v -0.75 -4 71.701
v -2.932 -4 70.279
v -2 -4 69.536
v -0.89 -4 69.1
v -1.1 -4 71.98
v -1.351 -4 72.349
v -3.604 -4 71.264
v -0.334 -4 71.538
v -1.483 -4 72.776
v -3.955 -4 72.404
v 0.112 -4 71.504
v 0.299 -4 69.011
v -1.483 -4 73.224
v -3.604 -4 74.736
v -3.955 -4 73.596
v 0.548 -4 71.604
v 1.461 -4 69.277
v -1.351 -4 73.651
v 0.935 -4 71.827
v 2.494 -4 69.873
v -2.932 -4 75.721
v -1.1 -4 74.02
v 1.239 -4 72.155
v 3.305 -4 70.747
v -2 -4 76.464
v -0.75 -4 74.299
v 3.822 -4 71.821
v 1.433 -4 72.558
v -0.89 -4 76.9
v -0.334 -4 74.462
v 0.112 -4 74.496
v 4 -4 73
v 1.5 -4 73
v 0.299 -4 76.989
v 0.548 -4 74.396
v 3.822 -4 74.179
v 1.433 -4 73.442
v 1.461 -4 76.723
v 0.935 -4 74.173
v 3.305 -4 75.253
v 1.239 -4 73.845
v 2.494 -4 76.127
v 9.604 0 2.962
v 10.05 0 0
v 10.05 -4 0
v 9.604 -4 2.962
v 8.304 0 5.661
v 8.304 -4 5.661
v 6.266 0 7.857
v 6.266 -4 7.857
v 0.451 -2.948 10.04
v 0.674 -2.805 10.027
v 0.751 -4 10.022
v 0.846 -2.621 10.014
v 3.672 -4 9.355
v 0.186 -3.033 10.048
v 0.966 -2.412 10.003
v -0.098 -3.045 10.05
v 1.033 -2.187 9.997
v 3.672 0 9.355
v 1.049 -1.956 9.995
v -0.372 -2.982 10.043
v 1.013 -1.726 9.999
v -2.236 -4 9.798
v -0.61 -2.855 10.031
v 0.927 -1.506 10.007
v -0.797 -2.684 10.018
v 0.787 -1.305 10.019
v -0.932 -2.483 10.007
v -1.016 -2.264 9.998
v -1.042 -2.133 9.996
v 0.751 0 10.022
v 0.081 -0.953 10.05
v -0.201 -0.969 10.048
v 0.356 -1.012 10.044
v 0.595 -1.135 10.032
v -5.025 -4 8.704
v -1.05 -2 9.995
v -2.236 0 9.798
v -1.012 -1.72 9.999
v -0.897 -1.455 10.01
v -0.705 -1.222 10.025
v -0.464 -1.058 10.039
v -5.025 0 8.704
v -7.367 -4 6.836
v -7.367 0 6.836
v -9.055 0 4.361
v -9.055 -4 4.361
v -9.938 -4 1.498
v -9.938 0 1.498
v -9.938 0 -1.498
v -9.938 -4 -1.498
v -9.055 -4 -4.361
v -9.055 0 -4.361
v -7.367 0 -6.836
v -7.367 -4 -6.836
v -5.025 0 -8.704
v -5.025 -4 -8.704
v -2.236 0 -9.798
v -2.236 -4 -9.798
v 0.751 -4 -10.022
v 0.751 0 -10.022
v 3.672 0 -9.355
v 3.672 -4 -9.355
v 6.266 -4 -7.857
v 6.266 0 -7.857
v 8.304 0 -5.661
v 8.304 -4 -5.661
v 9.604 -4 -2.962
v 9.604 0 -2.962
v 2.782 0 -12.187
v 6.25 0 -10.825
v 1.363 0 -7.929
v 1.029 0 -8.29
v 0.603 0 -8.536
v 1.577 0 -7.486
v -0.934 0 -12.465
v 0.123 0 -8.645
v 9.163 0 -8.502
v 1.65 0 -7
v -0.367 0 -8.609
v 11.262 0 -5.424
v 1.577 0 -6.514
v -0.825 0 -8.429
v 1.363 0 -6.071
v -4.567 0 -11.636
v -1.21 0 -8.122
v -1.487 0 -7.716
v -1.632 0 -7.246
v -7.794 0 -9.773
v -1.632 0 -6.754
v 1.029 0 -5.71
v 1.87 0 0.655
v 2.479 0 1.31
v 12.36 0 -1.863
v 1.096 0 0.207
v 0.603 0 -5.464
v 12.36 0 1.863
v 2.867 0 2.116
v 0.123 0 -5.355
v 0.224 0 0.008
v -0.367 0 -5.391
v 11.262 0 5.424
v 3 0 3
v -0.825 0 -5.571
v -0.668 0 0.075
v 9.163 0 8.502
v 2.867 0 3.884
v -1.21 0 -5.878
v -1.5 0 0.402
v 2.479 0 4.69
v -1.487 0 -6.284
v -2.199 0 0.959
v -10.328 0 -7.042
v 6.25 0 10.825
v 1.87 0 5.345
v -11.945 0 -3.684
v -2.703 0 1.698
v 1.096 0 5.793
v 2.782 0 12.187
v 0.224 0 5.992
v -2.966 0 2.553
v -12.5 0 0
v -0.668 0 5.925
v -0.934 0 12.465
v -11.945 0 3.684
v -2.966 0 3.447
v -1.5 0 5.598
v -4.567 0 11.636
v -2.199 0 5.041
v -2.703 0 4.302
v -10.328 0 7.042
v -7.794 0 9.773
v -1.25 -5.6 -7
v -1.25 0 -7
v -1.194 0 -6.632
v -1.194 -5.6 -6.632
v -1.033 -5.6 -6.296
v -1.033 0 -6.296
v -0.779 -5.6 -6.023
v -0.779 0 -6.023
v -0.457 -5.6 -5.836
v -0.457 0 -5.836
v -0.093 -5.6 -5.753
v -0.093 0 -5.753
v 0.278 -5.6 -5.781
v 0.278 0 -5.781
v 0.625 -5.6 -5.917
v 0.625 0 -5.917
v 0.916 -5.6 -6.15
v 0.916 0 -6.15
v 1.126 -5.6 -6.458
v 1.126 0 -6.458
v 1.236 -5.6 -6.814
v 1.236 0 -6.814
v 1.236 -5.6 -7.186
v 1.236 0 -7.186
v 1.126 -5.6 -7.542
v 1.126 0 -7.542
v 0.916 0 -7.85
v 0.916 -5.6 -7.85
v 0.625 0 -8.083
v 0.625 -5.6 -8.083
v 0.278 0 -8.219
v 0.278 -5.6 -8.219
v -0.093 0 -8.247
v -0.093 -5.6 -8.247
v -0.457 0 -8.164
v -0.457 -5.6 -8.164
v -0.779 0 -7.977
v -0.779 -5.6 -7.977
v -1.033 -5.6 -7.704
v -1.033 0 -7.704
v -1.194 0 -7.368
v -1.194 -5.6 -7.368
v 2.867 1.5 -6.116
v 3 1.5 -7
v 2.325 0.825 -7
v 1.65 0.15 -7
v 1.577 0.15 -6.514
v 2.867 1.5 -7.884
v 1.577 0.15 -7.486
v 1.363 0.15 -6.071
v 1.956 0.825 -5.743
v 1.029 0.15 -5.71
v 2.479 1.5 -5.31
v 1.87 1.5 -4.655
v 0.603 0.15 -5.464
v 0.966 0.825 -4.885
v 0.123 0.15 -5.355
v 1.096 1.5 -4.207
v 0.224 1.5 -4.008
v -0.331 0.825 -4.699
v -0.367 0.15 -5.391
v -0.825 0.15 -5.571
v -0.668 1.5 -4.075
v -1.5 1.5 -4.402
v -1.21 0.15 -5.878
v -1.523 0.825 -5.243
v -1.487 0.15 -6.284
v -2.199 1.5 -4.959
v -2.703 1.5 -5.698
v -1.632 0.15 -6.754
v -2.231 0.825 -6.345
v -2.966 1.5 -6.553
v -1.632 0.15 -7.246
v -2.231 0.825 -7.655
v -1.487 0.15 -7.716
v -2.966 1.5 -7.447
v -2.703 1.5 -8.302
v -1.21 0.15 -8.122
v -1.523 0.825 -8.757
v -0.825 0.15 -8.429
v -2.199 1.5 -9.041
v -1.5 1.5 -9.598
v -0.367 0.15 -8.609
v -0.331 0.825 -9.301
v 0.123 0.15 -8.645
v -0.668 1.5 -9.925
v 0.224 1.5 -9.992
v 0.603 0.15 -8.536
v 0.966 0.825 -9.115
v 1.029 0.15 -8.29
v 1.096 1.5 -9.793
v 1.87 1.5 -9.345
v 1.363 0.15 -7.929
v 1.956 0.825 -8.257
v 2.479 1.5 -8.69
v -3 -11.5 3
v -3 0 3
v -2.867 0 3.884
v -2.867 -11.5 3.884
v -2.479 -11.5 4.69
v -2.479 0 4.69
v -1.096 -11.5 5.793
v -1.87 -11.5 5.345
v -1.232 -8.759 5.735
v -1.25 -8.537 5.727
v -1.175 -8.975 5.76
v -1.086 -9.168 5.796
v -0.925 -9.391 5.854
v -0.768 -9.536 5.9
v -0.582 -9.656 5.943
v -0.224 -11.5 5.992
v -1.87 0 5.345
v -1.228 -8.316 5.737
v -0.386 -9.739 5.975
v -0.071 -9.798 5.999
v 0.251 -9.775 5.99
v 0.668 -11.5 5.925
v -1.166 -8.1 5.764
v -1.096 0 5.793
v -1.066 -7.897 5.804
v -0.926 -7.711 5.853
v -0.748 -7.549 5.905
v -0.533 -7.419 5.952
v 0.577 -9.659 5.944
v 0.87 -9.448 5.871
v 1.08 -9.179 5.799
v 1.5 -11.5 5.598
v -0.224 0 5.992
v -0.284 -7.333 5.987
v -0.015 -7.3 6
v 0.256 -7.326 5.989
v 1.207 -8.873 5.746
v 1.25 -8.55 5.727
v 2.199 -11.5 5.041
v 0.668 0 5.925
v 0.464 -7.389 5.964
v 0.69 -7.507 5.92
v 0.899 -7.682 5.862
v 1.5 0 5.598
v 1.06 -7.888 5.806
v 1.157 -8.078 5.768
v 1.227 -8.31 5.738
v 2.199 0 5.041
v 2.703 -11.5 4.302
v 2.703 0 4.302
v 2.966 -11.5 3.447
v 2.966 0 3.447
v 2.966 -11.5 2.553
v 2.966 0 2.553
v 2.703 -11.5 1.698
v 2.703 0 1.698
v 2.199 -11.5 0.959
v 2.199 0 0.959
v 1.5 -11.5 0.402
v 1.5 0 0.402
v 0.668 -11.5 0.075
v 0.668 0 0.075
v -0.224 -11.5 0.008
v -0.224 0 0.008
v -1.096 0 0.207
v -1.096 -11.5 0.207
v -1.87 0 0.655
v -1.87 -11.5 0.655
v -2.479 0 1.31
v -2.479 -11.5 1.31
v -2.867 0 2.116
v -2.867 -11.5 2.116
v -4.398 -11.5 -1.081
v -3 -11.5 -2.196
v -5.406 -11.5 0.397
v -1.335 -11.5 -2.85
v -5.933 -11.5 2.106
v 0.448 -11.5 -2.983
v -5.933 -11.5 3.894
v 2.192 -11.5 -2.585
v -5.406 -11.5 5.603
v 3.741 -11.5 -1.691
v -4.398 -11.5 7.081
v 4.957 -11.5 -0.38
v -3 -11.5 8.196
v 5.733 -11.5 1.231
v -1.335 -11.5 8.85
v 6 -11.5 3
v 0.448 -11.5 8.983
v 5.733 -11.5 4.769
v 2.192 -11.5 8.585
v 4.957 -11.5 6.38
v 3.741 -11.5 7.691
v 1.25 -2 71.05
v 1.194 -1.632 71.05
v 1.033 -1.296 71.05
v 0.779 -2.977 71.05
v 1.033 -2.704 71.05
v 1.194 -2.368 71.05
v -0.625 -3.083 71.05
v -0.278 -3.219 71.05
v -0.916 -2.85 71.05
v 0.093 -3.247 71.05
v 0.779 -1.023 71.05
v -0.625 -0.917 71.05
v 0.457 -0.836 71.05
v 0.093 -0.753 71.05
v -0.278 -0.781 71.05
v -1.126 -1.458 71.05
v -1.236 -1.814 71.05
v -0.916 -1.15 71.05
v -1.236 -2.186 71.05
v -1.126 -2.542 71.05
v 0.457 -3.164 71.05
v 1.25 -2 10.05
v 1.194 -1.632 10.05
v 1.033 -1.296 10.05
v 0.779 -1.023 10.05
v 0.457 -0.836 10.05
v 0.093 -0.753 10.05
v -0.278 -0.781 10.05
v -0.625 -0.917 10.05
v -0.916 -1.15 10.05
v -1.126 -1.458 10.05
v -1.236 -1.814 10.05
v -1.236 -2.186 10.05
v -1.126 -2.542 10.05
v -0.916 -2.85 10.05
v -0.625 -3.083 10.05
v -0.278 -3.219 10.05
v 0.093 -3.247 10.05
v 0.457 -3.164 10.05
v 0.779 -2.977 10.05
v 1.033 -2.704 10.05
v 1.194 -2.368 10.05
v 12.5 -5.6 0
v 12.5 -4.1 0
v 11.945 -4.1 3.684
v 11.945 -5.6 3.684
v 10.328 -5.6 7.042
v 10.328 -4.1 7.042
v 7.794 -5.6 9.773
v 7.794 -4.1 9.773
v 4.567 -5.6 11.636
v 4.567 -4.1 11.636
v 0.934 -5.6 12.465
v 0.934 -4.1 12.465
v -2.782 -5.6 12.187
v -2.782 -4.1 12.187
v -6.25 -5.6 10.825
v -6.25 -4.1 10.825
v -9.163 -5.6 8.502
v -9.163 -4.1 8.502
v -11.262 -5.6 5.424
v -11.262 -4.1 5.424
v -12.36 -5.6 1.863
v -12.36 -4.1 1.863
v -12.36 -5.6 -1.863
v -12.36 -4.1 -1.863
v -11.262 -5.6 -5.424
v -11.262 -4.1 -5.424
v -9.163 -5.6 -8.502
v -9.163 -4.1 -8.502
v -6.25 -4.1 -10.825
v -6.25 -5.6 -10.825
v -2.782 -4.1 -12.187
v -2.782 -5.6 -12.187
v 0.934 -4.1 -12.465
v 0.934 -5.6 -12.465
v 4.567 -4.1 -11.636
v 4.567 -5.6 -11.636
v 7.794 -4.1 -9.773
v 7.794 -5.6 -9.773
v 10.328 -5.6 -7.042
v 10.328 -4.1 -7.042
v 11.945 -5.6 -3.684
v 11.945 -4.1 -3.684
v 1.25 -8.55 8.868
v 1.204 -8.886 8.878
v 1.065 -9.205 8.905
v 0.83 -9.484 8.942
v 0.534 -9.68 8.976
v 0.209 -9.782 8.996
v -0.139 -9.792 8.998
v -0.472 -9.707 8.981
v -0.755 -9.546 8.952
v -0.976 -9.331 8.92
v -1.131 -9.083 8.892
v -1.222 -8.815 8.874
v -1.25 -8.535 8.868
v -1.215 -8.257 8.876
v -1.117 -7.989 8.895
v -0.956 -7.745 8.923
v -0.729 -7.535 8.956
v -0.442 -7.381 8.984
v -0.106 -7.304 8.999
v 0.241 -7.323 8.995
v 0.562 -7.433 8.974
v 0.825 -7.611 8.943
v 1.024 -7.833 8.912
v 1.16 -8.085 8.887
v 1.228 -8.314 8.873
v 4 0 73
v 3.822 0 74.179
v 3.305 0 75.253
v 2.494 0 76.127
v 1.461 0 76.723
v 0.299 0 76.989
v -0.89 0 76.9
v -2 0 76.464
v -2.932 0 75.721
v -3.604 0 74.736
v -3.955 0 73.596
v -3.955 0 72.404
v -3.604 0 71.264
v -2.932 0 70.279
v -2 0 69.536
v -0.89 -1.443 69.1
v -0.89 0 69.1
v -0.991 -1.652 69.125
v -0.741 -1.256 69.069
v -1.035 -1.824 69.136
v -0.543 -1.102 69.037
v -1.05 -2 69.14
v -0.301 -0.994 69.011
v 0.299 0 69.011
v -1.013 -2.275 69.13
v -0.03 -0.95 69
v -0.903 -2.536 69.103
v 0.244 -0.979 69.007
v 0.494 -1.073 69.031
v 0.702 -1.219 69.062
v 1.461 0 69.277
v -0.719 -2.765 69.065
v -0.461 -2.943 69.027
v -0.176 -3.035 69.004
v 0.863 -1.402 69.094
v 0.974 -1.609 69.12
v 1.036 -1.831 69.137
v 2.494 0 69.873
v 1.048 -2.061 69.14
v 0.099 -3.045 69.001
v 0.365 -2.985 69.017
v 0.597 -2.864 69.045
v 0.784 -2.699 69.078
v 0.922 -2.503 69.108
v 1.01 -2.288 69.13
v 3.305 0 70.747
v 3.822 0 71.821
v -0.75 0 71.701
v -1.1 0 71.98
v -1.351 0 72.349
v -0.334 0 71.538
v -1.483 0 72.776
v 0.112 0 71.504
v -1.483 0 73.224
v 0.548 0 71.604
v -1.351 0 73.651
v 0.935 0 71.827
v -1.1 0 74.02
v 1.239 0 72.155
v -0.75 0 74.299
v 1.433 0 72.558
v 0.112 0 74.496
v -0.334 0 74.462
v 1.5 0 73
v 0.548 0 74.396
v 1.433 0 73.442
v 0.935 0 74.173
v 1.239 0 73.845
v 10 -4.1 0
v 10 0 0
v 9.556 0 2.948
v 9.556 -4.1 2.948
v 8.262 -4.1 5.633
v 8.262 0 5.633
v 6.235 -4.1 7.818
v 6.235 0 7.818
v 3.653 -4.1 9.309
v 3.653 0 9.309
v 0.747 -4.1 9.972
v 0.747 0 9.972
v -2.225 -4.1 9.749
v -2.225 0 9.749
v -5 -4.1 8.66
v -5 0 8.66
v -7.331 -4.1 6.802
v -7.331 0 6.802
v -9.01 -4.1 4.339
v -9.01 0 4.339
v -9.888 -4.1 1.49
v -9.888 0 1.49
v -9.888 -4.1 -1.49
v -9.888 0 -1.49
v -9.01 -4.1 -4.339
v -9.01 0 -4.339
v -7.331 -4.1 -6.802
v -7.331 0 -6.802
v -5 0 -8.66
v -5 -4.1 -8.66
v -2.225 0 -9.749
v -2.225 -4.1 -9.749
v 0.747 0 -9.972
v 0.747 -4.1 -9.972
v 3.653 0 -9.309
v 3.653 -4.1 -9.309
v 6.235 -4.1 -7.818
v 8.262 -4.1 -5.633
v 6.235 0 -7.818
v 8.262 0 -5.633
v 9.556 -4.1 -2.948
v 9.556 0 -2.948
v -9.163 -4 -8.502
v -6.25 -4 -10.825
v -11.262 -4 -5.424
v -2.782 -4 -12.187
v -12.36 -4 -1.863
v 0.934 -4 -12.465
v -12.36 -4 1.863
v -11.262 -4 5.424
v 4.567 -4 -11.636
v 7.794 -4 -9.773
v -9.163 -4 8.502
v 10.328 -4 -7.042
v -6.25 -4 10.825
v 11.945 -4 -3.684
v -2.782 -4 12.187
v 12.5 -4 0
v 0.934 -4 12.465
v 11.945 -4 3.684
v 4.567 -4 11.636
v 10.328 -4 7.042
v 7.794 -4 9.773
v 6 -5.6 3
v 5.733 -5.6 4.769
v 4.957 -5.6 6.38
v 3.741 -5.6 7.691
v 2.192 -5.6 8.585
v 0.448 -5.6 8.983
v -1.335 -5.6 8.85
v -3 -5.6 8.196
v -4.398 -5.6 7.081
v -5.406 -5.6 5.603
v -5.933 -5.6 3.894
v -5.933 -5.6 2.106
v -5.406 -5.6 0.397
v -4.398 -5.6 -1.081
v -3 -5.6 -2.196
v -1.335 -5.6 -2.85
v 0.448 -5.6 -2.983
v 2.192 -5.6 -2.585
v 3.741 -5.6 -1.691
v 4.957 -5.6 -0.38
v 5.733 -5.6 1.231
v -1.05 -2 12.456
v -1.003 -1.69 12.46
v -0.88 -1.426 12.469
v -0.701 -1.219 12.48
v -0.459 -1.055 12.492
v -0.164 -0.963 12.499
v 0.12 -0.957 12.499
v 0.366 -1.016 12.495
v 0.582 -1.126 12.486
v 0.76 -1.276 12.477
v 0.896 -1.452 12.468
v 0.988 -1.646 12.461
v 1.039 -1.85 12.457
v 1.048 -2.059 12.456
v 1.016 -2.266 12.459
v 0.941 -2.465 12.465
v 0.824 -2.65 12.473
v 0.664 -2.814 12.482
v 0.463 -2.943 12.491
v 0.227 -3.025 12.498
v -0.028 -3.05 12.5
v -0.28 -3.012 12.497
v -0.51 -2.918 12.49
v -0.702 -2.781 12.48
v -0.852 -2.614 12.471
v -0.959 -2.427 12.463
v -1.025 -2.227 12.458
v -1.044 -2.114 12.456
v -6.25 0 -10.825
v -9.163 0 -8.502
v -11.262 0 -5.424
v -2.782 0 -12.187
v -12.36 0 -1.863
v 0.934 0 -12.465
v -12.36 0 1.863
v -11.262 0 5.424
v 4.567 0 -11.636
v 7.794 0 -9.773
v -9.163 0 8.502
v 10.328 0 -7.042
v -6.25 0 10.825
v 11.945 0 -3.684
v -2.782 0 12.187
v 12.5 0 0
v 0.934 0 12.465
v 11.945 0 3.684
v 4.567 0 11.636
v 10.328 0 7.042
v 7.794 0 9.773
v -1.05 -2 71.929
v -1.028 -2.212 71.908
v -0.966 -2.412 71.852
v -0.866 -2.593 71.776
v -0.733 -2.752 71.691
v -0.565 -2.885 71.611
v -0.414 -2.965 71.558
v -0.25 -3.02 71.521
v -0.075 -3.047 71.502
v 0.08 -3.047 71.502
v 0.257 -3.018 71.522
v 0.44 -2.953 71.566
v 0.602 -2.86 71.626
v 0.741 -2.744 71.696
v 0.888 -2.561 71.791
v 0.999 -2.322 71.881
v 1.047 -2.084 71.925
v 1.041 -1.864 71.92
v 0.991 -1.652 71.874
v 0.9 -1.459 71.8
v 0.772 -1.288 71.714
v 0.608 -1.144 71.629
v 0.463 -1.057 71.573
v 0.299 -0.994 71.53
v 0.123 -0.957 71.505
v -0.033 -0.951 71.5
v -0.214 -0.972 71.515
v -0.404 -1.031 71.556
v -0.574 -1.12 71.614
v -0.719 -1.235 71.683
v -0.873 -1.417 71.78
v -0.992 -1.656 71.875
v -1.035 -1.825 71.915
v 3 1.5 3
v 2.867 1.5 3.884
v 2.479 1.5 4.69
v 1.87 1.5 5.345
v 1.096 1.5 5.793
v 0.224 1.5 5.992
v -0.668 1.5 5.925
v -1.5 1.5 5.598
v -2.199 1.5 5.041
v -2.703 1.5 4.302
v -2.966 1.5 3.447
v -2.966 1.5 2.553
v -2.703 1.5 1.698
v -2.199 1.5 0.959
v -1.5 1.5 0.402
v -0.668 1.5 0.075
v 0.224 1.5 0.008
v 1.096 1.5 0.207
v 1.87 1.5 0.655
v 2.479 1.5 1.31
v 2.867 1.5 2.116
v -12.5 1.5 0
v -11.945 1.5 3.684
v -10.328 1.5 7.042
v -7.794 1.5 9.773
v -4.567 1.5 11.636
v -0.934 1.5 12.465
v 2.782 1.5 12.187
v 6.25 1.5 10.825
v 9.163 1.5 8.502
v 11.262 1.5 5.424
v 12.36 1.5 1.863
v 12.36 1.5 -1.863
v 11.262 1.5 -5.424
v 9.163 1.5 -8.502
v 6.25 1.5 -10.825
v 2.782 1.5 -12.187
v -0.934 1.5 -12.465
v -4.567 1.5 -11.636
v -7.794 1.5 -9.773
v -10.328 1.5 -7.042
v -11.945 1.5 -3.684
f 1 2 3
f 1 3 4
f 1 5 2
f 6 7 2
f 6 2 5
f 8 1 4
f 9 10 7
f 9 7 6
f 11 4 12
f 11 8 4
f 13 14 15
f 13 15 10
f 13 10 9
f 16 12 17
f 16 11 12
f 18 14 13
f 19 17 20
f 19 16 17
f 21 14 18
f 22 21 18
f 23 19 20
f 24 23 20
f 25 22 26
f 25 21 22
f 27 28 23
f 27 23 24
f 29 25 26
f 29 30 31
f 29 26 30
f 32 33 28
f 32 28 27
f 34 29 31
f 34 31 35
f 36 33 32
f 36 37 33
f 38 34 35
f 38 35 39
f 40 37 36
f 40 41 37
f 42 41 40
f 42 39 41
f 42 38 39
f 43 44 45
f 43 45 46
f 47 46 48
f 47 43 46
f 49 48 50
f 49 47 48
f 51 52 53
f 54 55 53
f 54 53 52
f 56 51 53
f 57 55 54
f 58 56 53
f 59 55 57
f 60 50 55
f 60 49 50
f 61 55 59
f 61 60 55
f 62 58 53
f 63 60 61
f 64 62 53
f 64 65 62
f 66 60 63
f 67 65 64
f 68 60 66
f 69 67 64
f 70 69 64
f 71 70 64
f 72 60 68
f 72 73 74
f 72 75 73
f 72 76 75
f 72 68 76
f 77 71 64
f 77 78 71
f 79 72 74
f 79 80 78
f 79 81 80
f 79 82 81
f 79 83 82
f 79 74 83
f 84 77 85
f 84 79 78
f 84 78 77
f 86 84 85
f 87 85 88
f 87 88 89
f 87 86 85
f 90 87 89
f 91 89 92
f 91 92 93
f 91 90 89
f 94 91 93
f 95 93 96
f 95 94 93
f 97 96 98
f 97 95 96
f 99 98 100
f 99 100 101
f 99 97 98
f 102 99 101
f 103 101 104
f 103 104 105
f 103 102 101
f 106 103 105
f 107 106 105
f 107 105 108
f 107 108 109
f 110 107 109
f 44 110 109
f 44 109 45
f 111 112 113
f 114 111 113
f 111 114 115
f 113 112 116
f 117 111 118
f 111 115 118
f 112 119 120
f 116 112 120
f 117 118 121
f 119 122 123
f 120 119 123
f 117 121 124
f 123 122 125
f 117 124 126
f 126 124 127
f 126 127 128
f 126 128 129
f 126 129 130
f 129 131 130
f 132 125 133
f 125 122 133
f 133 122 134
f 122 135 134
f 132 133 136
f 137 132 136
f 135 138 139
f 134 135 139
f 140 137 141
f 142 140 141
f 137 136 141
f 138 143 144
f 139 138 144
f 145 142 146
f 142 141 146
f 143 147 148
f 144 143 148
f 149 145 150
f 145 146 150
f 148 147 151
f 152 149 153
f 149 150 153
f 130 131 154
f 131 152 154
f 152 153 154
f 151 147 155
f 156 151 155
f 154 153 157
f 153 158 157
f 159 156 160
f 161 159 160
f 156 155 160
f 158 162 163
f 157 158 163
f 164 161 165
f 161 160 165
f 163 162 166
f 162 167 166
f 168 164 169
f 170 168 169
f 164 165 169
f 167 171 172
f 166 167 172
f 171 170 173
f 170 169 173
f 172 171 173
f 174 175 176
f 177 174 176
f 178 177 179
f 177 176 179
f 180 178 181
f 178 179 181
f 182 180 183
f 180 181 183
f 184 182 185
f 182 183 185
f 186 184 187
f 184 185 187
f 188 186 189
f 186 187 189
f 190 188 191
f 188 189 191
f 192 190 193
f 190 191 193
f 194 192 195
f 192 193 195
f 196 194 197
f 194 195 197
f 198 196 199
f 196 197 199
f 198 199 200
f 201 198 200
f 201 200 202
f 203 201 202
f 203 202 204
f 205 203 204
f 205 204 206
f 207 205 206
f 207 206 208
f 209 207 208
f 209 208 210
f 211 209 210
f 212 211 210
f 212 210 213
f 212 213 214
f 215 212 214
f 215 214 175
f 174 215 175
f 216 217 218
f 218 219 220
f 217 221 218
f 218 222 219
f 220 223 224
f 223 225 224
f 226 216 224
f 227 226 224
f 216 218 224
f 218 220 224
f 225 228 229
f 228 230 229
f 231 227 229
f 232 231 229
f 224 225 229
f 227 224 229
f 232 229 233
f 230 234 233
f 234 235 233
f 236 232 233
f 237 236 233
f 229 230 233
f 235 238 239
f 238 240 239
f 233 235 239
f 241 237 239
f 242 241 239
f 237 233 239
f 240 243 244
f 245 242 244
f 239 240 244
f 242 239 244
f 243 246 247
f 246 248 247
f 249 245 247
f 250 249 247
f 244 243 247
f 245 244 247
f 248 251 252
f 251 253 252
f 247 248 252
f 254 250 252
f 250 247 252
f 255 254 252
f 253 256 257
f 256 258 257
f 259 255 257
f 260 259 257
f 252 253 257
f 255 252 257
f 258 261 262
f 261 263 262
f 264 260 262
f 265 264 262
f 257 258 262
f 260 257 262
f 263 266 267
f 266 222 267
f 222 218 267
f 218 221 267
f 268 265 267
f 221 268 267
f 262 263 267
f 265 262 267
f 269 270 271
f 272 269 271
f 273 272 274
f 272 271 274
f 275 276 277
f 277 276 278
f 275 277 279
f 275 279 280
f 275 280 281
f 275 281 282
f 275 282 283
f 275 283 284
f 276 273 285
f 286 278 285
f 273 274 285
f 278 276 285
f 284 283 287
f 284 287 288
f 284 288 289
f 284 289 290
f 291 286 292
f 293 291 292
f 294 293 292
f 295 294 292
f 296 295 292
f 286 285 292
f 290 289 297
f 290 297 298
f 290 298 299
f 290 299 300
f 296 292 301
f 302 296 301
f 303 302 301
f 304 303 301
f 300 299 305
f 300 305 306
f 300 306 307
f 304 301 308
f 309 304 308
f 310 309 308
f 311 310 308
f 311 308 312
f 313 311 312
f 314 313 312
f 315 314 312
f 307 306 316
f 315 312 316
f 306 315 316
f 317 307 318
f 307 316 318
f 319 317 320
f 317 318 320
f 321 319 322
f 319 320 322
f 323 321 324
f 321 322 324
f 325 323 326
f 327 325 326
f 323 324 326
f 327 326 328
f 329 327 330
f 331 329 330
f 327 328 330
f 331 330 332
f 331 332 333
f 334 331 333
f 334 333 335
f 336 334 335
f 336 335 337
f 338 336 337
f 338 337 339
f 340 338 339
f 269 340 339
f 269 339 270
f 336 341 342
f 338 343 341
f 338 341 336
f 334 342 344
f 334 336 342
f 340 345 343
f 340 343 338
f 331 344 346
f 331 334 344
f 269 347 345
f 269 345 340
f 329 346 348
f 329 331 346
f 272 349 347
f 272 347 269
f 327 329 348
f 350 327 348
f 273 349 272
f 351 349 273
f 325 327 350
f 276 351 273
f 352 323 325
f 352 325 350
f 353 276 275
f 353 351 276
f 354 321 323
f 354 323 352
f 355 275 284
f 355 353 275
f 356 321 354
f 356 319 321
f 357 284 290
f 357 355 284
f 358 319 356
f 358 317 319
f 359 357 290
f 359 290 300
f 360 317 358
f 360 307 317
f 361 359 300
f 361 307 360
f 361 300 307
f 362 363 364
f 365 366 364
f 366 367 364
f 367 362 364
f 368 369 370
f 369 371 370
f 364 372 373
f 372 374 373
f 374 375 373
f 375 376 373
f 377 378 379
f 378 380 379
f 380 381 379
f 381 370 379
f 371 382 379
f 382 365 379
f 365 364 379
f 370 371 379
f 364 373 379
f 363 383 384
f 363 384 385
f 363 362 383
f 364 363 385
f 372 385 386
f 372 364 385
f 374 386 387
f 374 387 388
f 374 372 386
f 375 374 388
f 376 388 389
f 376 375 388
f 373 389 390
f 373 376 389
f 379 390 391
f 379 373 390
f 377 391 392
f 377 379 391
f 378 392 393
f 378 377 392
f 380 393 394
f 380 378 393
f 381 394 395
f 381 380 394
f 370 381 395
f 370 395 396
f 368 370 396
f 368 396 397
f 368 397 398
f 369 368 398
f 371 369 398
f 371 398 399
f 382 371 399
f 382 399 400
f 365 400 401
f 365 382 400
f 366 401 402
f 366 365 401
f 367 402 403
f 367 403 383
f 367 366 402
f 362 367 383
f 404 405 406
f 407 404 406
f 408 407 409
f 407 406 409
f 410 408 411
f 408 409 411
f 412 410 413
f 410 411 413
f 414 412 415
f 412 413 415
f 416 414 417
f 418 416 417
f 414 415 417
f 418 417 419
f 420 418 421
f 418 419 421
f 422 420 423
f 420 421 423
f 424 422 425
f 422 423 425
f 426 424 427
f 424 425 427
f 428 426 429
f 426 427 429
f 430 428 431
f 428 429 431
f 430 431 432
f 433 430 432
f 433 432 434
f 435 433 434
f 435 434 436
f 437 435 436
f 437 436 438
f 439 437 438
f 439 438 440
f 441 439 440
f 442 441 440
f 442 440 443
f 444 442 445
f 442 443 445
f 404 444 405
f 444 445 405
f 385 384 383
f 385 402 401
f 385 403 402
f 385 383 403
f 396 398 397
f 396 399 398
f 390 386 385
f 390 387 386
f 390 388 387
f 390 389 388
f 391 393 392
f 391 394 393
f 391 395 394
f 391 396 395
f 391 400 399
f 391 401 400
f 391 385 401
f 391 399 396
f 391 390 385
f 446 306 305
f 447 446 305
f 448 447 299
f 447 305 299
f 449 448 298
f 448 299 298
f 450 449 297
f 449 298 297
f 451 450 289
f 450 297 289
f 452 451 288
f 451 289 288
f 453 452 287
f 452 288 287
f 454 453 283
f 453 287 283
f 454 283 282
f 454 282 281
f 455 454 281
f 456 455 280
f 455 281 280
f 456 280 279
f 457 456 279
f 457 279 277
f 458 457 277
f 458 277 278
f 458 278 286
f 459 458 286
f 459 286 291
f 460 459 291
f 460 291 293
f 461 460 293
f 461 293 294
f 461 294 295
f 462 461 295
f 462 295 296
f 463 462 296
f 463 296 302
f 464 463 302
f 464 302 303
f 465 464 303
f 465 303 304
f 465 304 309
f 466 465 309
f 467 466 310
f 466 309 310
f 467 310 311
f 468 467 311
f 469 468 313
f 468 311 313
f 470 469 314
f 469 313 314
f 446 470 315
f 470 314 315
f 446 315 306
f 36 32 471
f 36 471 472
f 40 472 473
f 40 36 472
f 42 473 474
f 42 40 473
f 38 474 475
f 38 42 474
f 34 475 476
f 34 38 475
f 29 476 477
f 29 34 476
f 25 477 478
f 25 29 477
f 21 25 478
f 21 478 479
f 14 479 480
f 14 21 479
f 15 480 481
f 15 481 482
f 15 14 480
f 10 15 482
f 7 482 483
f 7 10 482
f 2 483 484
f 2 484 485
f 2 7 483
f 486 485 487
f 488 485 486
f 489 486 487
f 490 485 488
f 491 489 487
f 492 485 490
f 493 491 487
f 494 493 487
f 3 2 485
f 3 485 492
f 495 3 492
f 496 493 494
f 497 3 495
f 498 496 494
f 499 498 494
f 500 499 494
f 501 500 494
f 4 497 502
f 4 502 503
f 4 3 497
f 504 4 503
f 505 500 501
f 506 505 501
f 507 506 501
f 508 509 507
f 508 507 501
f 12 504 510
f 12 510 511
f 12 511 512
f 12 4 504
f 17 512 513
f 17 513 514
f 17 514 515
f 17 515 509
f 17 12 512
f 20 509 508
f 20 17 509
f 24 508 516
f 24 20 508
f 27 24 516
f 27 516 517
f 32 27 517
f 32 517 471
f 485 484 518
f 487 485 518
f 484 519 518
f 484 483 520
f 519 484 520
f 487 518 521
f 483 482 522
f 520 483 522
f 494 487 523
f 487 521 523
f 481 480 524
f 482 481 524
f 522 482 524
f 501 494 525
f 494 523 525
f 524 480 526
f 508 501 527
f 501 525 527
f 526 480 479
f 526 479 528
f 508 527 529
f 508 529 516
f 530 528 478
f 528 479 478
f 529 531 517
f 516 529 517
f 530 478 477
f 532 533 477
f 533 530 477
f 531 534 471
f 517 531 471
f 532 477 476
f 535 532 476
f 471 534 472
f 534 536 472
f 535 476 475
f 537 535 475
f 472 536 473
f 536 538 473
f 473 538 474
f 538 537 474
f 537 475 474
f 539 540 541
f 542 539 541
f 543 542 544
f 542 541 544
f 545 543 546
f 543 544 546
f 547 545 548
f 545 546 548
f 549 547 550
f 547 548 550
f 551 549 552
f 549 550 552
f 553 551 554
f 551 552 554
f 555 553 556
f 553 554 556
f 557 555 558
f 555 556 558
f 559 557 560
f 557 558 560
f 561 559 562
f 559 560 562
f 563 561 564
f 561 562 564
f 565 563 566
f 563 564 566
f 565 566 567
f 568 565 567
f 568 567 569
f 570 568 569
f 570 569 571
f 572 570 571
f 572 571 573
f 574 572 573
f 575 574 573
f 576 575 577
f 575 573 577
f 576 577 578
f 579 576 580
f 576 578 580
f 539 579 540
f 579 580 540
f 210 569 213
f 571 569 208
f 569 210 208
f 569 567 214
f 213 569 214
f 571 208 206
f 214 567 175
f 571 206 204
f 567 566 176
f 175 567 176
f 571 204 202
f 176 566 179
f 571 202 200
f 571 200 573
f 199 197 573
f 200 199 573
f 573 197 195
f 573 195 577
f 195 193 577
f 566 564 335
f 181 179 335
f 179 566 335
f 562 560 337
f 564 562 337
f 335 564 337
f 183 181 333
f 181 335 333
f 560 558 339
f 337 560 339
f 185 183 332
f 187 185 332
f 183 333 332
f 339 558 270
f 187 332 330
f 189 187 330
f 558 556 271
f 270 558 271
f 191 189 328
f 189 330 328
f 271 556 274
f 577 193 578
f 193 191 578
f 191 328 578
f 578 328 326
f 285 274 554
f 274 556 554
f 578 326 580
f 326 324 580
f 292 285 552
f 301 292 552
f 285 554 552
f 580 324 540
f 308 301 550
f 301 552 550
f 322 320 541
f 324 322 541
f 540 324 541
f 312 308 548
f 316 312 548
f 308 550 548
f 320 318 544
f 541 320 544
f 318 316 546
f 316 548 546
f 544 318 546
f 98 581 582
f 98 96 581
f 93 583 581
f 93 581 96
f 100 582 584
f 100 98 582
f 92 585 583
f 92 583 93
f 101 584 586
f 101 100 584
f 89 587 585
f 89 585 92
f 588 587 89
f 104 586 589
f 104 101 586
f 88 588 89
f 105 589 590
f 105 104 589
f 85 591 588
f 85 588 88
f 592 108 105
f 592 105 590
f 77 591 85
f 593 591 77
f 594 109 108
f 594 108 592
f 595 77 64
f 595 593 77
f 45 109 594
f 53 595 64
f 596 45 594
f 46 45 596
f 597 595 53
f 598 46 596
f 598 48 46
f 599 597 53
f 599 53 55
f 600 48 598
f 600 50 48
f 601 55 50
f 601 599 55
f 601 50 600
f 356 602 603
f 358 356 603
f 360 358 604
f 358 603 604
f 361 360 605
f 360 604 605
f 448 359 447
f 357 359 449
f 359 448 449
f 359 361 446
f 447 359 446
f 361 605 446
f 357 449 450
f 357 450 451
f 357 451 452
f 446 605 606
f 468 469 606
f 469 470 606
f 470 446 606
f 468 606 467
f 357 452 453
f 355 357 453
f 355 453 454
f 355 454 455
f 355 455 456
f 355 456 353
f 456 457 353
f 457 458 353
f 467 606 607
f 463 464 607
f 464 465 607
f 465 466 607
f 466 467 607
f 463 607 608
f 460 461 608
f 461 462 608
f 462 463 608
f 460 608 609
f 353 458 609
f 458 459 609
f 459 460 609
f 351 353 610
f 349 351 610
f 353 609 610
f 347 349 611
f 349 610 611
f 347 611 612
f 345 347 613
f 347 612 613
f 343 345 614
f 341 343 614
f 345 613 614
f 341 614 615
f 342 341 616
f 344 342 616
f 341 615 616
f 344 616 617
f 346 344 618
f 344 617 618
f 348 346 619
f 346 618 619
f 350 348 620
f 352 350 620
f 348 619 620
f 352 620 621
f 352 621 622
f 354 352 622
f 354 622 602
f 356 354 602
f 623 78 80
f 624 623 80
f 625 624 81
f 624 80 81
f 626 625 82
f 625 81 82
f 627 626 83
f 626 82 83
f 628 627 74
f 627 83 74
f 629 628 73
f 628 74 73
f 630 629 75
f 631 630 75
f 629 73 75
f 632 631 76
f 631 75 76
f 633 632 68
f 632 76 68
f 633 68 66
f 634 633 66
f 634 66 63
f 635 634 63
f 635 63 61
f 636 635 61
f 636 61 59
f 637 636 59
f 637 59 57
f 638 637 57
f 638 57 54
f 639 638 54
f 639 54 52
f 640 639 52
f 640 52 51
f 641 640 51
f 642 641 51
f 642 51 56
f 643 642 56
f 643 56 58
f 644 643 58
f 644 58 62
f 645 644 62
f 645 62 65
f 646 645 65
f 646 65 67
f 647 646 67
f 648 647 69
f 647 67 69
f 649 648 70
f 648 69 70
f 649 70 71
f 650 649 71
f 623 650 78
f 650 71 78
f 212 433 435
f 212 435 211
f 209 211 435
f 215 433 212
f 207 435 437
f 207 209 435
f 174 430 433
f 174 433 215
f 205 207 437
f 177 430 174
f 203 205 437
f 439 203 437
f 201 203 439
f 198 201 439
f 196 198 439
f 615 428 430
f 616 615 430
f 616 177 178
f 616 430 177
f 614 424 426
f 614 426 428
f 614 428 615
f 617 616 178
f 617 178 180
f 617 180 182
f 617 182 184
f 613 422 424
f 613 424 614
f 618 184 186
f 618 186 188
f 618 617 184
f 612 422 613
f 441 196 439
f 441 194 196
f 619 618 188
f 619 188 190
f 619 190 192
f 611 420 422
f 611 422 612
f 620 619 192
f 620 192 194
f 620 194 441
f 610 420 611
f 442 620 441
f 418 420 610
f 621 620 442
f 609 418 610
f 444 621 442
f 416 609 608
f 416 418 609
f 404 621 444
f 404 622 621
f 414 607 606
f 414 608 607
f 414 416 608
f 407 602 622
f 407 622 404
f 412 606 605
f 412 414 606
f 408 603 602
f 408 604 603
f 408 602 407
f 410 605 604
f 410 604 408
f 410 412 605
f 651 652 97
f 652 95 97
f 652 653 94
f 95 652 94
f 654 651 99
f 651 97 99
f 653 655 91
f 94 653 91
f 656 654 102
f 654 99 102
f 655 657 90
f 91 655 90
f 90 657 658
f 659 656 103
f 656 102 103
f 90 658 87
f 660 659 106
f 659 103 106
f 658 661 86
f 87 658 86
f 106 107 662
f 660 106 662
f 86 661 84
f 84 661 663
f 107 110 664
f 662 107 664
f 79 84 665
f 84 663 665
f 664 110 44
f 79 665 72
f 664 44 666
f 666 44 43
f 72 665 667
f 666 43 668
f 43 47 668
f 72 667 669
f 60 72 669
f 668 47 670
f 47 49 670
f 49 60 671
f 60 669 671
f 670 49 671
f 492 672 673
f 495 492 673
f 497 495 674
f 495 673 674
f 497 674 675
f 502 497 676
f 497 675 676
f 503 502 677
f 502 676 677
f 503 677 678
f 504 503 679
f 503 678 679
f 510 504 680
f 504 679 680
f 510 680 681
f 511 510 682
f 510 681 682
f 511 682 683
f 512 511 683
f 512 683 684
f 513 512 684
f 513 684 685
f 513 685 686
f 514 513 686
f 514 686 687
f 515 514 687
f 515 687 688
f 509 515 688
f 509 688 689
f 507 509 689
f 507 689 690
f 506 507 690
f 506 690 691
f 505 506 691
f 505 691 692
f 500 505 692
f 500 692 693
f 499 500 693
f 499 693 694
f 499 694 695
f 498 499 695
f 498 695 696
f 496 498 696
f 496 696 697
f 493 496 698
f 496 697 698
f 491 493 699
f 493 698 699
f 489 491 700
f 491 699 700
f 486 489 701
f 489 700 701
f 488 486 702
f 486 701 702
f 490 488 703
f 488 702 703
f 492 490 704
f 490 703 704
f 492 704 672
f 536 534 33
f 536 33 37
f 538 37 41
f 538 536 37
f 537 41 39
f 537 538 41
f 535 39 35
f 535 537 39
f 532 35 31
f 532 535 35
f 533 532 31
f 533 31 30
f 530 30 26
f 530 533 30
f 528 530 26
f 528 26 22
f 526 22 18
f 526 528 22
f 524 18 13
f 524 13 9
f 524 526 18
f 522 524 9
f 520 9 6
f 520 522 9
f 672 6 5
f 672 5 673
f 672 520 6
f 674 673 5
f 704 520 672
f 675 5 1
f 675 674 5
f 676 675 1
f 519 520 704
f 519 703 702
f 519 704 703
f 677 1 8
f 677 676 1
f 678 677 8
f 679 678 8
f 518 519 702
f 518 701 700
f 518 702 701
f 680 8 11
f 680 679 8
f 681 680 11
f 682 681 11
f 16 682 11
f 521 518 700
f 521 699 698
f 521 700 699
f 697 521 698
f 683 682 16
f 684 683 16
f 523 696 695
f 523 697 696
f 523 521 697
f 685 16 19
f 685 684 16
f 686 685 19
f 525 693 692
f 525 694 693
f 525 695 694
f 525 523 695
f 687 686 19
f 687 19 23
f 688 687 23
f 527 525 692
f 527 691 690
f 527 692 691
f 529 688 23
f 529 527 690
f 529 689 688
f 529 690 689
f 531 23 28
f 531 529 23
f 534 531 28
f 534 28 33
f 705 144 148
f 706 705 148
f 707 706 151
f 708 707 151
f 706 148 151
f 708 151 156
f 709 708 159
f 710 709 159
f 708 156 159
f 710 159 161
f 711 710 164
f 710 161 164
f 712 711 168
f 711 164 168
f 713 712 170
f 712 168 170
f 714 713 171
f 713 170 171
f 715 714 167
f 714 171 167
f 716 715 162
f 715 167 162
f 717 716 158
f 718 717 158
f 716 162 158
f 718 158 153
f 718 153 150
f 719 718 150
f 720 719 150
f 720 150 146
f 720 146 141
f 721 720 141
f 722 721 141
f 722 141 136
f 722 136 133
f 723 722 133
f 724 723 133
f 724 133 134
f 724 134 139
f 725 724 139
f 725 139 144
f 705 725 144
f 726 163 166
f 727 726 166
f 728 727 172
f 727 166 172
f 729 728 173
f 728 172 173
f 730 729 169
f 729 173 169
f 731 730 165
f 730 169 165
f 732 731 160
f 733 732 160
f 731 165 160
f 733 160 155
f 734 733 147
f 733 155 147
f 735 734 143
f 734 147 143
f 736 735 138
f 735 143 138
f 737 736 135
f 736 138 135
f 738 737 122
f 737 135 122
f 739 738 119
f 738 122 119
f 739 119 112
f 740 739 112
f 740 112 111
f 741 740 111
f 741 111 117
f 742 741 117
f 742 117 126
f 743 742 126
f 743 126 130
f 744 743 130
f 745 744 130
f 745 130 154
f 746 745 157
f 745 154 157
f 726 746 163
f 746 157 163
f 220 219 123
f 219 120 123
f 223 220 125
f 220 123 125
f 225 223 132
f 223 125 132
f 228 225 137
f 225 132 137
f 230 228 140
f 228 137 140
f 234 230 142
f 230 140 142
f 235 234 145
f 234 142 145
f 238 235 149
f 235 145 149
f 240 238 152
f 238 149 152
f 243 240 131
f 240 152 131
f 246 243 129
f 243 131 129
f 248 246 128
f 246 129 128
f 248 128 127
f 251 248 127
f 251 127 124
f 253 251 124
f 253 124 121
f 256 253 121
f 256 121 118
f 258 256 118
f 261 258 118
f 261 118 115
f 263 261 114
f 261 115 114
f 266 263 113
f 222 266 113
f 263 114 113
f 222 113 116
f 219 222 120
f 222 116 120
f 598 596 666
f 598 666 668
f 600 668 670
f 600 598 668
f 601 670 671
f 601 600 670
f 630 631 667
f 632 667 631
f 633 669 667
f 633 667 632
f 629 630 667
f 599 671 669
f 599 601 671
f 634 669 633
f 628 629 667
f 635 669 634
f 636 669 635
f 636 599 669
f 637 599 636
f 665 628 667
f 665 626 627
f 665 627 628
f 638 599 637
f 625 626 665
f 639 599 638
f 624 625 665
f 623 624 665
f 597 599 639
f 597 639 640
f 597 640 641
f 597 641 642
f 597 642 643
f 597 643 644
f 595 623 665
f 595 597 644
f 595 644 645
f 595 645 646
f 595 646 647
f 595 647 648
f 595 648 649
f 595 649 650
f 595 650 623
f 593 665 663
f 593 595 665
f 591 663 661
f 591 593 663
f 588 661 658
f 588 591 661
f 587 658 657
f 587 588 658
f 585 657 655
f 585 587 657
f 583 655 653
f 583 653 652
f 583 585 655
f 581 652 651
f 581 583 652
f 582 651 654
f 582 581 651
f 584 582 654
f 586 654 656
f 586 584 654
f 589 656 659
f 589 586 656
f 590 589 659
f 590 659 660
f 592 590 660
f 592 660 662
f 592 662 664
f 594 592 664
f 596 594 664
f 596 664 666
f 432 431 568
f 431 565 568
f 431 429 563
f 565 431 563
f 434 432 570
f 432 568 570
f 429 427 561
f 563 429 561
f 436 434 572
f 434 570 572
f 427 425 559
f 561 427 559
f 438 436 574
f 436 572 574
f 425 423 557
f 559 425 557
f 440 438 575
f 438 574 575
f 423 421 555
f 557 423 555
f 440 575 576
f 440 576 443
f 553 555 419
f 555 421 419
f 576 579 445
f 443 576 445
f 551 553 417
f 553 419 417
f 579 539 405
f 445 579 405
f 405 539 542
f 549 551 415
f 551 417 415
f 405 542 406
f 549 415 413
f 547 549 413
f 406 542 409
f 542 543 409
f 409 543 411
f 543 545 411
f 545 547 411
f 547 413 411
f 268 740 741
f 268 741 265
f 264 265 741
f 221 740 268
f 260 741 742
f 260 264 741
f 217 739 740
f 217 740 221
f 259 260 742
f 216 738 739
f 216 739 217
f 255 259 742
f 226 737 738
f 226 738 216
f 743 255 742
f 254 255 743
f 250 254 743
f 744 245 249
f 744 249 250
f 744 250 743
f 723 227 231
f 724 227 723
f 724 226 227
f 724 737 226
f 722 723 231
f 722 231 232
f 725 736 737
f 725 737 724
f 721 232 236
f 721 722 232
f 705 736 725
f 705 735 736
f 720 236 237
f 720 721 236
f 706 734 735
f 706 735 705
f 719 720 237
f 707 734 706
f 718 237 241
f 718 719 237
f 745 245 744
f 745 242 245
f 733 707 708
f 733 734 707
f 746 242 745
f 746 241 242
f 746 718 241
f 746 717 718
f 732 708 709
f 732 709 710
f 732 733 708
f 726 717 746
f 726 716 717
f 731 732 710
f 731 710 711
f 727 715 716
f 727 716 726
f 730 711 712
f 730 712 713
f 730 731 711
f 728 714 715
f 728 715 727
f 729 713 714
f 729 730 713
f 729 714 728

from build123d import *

# Parameters (mm, degrees)
F0_R            = 10
F1_DEPTH        = 4.1
F2_R            = 12.5
F3_DEPTH        = 1.5
F4_R            = 6
F5_DEPTH        = 5.9
F7_D            = 6
F9_D            = 2.5
F12_D           = 2.5
F12_DEPTH       = 9.501
F13_R           = 12.5
F14_DEPTH       = 1.5
F16_D           = 3.3
F16_CSINK_D     = 6
F16_CSINK_ANGLE = 90
F17_D           = 6
F19_R           = 12.5
F19_R_2         = 10.05
F20_DEPTH       = 2
F23_D           = 2.1
F23_DEPTH       = 3
F23_START       = 0.0441782
F23_TIP         = 0.63090365
F24_R           = 4
F24_R_2         = 1.5
F25_DEPTH       = 2
F28_D           = 2.1
F28_DEPTH       = 3
F28_START       = 0.1402721
F28_TIP         = 0.63090365
F29_W           = 1.25
F29_H           = 61


with BuildPart() as f1:
    # F0 (on Front) → F1 (new body)
    with BuildSketch(Plane.XZ):
        Circle(F0_R)
    extrude(amount=F1_DEPTH)

    # F2 (on face) → F3 (join)
    with BuildSketch(Plane.XZ.offset(4.1)):
        Circle(F2_R)
    extrude(amount=F3_DEPTH)

    # F4 (on face) → F5 (join)
    with BuildSketch(Plane.XZ.offset(5.6)):
        with Locations((0, 3)):
            Circle(F4_R)
    extrude(amount=F5_DEPTH)

    # F7 (through all)
    with Locations(Plane.XZ.offset(11.5)):
        with Locations((0, 3)):
            Hole(F7_D / 2)

    # F9 (through all)
    with Locations(Plane.XZ.offset(5.6)):
        with Locations((0, -7)):
            Hole(F9_D / 2)

    # F12 (through all, one way)
    with BuildSketch(Plane(origin=(0, 0, 3), x_dir=(1, 0, 0), z_dir=(0, 0, -1))):
        with Locations((0, 8.55)):
            Circle(F12_D / 2)
    extrude(amount=-F12_DEPTH, mode=Mode.SUBTRACT)


with BuildPart() as f14:
    # F13 (on face) → F14 (new body)
    with BuildSketch(Plane(origin=(0, 0, 0), x_dir=(-1, 0, 0), z_dir=(0, 1, 0))):
        Circle(F13_R)
    extrude(amount=F14_DEPTH)

    # F16 (through all)
    with Locations(Plane(origin=(0, 1.5, 0), x_dir=(-1, 0, 0), z_dir=(0, 1, 0))):
        with Locations((0, -7)):
            CounterSinkHole(F16_D / 2, F16_CSINK_D / 2, counter_sink_angle=F16_CSINK_ANGLE)

    # F17 (through all)
    with Locations(Plane(origin=(0, 1.5, 0), x_dir=(-1, 0, 0), z_dir=(0, 1, 0))):
        with Locations((0, 3)):
            Hole(F17_D / 2)


with BuildPart() as f20:
    # F19 (on offset) → F20 (new body, symmetric)
    with BuildSketch(Plane.XZ.offset(2)):
        Circle(F19_R)
        Circle(F19_R_2, mode=Mode.SUBTRACT)
    extrude(amount=F20_DEPTH, both=True)

    # F23
    # its depths count from where the whole tool has entered the part; down to there all is cleared
    with Locations(Plane.XY.offset(12.5).offset(-F23_START)):
        with Locations((0, -2)):
            Hole(F23_D / 2, depth=F23_DEPTH)
            with Locations((0, 0, -(F23_DEPTH + F23_TIP / 2))):  # 118° drill point
                Cone(0, F23_D / 2, F23_TIP, mode=Mode.SUBTRACT)


with BuildPart() as f25:
    # F24 (on offset) → F25 (new body, symmetric)
    with BuildSketch(Plane.XZ.offset(2)):
        with Locations((0, 73)):
            Circle(F24_R)
        with Locations((0, 73)):
            Circle(F24_R_2, mode=Mode.SUBTRACT)
    extrude(amount=F25_DEPTH, both=True)

    # F28
    # its depths count from where the whole tool has entered the part; down to there all is cleared
    with Locations(Plane(origin=(0, 0, 69), x_dir=(1, 0, 0), z_dir=(0, 0, -1)).offset(-F28_START)):
        with Locations((0, 2)):
            Hole(F28_D / 2, depth=F28_DEPTH)
            with Locations((0, 0, -(F28_DEPTH + F28_TIP / 2))):  # 118° drill point
                Cone(0, F28_D / 2, F28_TIP, mode=Mode.SUBTRACT)


with BuildPart() as f30:
    # F29 (on offset) → F30 (revolve)
    with BuildSketch(Plane.XZ.offset(2)):
        with Locations((0.625, 40.55)):
            Rectangle(F29_W, F29_H)
    revolve(axis=Axis((0, -2, 36.5), (0, 0, 1)))


solid = Compound([f1.part, f14.part, f20.part, f25.part, f30.part])
